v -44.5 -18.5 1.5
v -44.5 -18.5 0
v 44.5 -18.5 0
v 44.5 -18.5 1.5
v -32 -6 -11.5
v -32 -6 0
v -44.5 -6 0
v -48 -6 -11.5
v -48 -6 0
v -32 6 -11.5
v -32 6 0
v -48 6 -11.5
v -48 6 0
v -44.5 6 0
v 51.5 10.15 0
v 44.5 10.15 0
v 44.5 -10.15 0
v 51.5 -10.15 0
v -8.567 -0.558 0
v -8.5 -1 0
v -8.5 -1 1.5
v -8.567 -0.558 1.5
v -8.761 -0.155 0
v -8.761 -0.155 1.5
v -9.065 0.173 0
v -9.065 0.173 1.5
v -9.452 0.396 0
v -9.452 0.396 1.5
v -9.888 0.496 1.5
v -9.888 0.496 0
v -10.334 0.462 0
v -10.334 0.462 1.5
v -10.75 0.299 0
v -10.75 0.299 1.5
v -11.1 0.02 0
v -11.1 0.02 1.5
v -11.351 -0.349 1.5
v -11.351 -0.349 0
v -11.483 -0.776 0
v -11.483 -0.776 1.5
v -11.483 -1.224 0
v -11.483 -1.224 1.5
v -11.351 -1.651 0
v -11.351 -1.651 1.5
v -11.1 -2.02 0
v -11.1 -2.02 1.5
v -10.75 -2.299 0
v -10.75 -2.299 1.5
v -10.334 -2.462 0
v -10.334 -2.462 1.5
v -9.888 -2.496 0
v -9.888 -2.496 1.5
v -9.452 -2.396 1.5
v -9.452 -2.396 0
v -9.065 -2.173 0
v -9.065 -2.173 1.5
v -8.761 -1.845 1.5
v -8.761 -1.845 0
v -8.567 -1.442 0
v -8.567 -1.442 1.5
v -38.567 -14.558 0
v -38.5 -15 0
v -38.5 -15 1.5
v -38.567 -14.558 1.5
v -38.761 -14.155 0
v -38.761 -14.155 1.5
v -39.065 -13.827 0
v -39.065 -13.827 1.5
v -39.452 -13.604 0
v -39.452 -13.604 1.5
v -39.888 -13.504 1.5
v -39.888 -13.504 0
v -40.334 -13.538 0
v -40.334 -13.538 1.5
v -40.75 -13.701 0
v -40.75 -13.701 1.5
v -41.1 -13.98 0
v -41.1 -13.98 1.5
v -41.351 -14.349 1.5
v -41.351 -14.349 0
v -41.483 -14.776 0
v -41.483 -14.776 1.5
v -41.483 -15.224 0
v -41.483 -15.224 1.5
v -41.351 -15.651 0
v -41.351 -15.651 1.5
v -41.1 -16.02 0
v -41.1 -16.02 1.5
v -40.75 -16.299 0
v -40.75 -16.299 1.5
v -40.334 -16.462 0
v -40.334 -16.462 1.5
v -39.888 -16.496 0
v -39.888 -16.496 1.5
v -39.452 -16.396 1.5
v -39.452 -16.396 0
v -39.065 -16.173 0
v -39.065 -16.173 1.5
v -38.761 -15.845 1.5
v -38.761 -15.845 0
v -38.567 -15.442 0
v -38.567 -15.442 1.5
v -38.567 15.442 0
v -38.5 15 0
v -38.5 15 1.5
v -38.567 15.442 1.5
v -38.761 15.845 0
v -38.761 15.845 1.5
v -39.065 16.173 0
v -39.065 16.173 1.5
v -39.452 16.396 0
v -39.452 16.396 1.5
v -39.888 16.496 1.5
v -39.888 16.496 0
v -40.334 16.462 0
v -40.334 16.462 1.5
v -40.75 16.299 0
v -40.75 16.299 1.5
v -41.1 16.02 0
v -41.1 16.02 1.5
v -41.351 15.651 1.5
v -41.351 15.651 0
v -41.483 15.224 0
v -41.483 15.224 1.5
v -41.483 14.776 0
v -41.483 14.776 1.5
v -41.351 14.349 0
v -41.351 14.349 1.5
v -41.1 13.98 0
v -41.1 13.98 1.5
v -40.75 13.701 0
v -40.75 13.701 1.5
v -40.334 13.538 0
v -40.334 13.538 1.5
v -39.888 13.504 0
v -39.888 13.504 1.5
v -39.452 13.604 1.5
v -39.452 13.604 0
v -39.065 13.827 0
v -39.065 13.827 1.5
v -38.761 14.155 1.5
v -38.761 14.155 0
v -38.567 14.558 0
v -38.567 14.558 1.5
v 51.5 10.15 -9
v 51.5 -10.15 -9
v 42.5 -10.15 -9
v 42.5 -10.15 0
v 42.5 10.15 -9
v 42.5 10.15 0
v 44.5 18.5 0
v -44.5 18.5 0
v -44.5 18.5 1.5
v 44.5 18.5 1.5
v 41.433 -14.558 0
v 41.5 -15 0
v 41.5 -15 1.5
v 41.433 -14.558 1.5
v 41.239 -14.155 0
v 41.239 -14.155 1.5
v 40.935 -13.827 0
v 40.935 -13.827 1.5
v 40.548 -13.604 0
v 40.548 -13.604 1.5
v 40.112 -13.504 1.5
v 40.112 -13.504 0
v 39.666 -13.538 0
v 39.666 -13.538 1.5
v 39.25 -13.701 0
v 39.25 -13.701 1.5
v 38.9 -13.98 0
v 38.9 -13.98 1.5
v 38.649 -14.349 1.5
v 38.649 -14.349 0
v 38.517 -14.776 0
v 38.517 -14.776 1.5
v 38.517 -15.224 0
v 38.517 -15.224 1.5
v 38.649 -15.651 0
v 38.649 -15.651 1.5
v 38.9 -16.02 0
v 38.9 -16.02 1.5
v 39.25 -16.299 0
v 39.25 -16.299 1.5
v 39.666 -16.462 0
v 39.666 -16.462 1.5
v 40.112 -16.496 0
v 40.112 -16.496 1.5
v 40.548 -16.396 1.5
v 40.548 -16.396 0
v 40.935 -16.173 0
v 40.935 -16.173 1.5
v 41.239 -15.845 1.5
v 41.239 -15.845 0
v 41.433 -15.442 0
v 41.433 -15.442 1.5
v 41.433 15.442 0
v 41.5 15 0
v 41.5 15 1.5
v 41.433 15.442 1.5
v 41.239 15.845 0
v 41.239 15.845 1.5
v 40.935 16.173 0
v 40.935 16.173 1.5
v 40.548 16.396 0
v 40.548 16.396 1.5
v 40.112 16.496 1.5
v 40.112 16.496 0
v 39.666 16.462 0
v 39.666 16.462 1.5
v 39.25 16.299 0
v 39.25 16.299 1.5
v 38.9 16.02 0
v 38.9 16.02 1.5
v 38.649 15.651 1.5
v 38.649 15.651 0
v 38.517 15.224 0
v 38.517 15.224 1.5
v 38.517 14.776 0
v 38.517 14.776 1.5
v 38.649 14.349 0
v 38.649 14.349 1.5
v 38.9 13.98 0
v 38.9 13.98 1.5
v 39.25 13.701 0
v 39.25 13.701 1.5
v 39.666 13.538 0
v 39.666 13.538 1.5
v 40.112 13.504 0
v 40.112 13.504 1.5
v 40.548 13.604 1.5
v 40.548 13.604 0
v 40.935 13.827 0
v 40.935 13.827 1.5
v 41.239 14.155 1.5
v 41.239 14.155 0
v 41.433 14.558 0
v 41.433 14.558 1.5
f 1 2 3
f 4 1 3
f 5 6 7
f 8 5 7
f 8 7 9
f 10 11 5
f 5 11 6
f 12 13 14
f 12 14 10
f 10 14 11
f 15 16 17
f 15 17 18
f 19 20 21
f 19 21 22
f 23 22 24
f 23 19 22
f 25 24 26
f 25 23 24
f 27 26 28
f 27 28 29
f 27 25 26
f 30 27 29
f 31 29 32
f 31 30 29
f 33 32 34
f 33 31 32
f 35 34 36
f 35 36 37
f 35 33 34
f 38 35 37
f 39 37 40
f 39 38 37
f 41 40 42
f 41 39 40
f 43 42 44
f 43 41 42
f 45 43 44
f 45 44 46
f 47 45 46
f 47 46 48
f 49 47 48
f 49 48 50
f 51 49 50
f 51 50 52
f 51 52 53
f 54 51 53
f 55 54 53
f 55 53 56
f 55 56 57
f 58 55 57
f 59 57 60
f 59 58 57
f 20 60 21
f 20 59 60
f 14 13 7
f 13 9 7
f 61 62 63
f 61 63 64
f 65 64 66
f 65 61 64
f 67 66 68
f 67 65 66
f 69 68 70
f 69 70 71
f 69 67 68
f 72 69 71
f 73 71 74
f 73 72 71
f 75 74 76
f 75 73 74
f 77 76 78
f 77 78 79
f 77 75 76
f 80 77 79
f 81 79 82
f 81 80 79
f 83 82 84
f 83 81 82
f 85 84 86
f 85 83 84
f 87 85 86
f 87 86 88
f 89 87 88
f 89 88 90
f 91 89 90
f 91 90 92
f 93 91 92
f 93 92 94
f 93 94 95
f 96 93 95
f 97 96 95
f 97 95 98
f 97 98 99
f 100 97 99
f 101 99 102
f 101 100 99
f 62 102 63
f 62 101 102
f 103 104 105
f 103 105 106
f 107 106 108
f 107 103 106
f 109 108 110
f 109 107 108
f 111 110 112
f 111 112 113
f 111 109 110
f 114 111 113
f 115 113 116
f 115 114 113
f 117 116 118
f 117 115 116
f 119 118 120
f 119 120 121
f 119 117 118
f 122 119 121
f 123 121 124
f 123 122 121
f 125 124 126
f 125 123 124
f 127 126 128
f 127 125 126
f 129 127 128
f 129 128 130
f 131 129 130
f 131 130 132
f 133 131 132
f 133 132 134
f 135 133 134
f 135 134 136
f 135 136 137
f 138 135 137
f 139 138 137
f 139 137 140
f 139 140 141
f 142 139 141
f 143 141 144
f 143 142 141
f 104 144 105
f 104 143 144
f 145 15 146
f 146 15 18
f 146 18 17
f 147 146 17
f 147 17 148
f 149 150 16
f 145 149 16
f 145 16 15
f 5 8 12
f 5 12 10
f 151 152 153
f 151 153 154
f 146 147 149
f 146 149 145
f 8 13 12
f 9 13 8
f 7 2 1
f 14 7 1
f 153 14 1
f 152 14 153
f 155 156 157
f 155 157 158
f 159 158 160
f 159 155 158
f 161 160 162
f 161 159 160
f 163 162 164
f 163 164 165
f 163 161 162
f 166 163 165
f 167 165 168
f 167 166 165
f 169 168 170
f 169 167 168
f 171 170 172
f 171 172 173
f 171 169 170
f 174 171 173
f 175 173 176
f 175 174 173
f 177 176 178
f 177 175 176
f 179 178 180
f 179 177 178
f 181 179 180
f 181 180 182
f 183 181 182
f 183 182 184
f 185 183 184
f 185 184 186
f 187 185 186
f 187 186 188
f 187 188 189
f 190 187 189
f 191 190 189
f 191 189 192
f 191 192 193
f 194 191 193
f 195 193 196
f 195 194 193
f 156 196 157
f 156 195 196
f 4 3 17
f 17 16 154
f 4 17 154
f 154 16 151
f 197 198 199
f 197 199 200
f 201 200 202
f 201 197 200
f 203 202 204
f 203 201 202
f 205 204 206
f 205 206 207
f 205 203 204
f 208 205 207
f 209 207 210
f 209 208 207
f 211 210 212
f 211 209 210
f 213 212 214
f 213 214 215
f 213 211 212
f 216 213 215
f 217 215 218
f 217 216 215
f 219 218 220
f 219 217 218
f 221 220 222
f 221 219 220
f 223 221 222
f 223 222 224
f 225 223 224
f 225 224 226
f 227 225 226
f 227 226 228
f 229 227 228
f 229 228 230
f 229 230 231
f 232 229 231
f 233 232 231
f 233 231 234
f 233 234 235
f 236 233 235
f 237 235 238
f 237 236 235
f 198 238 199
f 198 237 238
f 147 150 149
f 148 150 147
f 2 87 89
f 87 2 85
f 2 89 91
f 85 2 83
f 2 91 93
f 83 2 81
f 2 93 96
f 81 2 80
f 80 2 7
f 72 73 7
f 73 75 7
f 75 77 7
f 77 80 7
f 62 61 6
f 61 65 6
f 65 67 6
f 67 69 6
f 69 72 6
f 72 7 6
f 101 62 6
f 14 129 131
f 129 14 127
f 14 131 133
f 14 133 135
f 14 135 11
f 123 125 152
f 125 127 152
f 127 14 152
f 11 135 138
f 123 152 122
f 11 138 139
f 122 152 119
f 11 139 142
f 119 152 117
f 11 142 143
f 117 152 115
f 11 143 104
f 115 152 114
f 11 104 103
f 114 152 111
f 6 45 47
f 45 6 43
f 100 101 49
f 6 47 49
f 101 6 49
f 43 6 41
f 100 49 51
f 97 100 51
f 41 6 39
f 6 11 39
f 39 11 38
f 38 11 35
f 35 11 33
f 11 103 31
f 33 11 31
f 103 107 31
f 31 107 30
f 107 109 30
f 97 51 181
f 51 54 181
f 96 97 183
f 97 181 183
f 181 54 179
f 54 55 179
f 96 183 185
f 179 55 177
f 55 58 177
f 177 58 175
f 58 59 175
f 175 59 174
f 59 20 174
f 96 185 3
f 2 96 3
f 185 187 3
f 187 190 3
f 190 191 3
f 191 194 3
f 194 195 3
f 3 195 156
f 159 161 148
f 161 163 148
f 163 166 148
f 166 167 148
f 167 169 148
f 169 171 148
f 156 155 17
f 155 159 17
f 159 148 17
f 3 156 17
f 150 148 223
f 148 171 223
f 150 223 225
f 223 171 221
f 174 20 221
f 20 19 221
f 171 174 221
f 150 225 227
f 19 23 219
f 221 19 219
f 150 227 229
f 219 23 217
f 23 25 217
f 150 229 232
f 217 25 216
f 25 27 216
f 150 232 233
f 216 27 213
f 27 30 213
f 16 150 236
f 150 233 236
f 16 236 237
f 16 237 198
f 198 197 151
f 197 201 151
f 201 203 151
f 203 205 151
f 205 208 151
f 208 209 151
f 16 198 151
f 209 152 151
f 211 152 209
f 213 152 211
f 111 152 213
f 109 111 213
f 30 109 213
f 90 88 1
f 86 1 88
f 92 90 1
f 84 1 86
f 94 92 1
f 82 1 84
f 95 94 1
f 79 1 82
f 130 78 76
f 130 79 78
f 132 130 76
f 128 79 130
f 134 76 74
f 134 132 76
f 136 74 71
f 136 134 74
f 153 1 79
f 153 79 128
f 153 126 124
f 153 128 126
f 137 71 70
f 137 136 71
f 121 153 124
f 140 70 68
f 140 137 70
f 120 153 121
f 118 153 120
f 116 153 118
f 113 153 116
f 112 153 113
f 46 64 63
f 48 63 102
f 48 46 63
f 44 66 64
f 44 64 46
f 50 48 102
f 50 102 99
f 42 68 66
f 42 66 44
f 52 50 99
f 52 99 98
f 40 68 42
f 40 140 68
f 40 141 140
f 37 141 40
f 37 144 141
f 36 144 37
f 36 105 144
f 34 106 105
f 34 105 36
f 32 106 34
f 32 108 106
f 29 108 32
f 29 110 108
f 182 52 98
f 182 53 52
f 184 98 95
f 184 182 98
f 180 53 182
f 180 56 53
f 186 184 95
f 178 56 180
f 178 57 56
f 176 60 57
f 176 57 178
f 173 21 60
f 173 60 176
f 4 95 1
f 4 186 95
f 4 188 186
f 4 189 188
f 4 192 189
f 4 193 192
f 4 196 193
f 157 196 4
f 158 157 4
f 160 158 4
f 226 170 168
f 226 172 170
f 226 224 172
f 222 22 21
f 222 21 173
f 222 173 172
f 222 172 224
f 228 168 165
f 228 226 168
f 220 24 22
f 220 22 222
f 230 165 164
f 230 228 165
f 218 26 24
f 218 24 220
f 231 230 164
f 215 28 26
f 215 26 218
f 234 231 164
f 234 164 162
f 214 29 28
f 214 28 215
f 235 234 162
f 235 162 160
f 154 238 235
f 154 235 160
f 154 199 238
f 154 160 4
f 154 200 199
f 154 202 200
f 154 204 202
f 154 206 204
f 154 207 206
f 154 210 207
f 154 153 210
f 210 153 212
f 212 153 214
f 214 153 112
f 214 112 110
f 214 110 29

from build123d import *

# Parameters (mm, degrees)
F0_W     = 89
F0_H     = 37
F0_R     = 1.5
F1_DEPTH = 1.5
F2_W     = 12.5
F2_H     = 12
F2_W_2   = 3.5
F3_DEPTH = 11.5
F2_W_3   = 7
F2_H_2   = 20.3
F2_W_4   = 2
F4_DEPTH = 9


with BuildPart() as f1:
    # F0 (on Top) → F1 (new body)
    with BuildSketch(Plane.XY):
        Rectangle(F0_W, F0_H)
        with Locations((-40, -15)):
            Circle(F0_R, mode=Mode.SUBTRACT)
        with Locations((-10, -1)):
            Circle(F0_R, mode=Mode.SUBTRACT)
        with Locations((40, -15)):
            Circle(F0_R, mode=Mode.SUBTRACT)
        with Locations((-40, 15)):
            Circle(F0_R, mode=Mode.SUBTRACT)
        with Locations((40, 15)):
            Circle(F0_R, mode=Mode.SUBTRACT)
    extrude(amount=F1_DEPTH)

    # F2 (on face) → F3 (join)
    with BuildSketch(Plane(origin=(0, 0, 0), x_dir=(1, 0, 0), z_dir=(0, 0, -1))):
        with Locations((-38.25, 0)):
            Rectangle(F2_W, F2_H)
        with Locations((-46.25, 0)):
            Rectangle(F2_W_2, F2_H)
    extrude(amount=F3_DEPTH)

    # F2 (on face) → F4 (join)
    with BuildSketch(Plane(origin=(0, 0, 0), x_dir=(1, 0, 0), z_dir=(0, 0, -1))):
        with Locations((48, 0)):
            Rectangle(F2_W_3, F2_H_2)
        with Locations((43.5, 0)):
            Rectangle(F2_W_4, F2_H_2)
    extrude(amount=F4_DEPTH)


solid = f1.part
